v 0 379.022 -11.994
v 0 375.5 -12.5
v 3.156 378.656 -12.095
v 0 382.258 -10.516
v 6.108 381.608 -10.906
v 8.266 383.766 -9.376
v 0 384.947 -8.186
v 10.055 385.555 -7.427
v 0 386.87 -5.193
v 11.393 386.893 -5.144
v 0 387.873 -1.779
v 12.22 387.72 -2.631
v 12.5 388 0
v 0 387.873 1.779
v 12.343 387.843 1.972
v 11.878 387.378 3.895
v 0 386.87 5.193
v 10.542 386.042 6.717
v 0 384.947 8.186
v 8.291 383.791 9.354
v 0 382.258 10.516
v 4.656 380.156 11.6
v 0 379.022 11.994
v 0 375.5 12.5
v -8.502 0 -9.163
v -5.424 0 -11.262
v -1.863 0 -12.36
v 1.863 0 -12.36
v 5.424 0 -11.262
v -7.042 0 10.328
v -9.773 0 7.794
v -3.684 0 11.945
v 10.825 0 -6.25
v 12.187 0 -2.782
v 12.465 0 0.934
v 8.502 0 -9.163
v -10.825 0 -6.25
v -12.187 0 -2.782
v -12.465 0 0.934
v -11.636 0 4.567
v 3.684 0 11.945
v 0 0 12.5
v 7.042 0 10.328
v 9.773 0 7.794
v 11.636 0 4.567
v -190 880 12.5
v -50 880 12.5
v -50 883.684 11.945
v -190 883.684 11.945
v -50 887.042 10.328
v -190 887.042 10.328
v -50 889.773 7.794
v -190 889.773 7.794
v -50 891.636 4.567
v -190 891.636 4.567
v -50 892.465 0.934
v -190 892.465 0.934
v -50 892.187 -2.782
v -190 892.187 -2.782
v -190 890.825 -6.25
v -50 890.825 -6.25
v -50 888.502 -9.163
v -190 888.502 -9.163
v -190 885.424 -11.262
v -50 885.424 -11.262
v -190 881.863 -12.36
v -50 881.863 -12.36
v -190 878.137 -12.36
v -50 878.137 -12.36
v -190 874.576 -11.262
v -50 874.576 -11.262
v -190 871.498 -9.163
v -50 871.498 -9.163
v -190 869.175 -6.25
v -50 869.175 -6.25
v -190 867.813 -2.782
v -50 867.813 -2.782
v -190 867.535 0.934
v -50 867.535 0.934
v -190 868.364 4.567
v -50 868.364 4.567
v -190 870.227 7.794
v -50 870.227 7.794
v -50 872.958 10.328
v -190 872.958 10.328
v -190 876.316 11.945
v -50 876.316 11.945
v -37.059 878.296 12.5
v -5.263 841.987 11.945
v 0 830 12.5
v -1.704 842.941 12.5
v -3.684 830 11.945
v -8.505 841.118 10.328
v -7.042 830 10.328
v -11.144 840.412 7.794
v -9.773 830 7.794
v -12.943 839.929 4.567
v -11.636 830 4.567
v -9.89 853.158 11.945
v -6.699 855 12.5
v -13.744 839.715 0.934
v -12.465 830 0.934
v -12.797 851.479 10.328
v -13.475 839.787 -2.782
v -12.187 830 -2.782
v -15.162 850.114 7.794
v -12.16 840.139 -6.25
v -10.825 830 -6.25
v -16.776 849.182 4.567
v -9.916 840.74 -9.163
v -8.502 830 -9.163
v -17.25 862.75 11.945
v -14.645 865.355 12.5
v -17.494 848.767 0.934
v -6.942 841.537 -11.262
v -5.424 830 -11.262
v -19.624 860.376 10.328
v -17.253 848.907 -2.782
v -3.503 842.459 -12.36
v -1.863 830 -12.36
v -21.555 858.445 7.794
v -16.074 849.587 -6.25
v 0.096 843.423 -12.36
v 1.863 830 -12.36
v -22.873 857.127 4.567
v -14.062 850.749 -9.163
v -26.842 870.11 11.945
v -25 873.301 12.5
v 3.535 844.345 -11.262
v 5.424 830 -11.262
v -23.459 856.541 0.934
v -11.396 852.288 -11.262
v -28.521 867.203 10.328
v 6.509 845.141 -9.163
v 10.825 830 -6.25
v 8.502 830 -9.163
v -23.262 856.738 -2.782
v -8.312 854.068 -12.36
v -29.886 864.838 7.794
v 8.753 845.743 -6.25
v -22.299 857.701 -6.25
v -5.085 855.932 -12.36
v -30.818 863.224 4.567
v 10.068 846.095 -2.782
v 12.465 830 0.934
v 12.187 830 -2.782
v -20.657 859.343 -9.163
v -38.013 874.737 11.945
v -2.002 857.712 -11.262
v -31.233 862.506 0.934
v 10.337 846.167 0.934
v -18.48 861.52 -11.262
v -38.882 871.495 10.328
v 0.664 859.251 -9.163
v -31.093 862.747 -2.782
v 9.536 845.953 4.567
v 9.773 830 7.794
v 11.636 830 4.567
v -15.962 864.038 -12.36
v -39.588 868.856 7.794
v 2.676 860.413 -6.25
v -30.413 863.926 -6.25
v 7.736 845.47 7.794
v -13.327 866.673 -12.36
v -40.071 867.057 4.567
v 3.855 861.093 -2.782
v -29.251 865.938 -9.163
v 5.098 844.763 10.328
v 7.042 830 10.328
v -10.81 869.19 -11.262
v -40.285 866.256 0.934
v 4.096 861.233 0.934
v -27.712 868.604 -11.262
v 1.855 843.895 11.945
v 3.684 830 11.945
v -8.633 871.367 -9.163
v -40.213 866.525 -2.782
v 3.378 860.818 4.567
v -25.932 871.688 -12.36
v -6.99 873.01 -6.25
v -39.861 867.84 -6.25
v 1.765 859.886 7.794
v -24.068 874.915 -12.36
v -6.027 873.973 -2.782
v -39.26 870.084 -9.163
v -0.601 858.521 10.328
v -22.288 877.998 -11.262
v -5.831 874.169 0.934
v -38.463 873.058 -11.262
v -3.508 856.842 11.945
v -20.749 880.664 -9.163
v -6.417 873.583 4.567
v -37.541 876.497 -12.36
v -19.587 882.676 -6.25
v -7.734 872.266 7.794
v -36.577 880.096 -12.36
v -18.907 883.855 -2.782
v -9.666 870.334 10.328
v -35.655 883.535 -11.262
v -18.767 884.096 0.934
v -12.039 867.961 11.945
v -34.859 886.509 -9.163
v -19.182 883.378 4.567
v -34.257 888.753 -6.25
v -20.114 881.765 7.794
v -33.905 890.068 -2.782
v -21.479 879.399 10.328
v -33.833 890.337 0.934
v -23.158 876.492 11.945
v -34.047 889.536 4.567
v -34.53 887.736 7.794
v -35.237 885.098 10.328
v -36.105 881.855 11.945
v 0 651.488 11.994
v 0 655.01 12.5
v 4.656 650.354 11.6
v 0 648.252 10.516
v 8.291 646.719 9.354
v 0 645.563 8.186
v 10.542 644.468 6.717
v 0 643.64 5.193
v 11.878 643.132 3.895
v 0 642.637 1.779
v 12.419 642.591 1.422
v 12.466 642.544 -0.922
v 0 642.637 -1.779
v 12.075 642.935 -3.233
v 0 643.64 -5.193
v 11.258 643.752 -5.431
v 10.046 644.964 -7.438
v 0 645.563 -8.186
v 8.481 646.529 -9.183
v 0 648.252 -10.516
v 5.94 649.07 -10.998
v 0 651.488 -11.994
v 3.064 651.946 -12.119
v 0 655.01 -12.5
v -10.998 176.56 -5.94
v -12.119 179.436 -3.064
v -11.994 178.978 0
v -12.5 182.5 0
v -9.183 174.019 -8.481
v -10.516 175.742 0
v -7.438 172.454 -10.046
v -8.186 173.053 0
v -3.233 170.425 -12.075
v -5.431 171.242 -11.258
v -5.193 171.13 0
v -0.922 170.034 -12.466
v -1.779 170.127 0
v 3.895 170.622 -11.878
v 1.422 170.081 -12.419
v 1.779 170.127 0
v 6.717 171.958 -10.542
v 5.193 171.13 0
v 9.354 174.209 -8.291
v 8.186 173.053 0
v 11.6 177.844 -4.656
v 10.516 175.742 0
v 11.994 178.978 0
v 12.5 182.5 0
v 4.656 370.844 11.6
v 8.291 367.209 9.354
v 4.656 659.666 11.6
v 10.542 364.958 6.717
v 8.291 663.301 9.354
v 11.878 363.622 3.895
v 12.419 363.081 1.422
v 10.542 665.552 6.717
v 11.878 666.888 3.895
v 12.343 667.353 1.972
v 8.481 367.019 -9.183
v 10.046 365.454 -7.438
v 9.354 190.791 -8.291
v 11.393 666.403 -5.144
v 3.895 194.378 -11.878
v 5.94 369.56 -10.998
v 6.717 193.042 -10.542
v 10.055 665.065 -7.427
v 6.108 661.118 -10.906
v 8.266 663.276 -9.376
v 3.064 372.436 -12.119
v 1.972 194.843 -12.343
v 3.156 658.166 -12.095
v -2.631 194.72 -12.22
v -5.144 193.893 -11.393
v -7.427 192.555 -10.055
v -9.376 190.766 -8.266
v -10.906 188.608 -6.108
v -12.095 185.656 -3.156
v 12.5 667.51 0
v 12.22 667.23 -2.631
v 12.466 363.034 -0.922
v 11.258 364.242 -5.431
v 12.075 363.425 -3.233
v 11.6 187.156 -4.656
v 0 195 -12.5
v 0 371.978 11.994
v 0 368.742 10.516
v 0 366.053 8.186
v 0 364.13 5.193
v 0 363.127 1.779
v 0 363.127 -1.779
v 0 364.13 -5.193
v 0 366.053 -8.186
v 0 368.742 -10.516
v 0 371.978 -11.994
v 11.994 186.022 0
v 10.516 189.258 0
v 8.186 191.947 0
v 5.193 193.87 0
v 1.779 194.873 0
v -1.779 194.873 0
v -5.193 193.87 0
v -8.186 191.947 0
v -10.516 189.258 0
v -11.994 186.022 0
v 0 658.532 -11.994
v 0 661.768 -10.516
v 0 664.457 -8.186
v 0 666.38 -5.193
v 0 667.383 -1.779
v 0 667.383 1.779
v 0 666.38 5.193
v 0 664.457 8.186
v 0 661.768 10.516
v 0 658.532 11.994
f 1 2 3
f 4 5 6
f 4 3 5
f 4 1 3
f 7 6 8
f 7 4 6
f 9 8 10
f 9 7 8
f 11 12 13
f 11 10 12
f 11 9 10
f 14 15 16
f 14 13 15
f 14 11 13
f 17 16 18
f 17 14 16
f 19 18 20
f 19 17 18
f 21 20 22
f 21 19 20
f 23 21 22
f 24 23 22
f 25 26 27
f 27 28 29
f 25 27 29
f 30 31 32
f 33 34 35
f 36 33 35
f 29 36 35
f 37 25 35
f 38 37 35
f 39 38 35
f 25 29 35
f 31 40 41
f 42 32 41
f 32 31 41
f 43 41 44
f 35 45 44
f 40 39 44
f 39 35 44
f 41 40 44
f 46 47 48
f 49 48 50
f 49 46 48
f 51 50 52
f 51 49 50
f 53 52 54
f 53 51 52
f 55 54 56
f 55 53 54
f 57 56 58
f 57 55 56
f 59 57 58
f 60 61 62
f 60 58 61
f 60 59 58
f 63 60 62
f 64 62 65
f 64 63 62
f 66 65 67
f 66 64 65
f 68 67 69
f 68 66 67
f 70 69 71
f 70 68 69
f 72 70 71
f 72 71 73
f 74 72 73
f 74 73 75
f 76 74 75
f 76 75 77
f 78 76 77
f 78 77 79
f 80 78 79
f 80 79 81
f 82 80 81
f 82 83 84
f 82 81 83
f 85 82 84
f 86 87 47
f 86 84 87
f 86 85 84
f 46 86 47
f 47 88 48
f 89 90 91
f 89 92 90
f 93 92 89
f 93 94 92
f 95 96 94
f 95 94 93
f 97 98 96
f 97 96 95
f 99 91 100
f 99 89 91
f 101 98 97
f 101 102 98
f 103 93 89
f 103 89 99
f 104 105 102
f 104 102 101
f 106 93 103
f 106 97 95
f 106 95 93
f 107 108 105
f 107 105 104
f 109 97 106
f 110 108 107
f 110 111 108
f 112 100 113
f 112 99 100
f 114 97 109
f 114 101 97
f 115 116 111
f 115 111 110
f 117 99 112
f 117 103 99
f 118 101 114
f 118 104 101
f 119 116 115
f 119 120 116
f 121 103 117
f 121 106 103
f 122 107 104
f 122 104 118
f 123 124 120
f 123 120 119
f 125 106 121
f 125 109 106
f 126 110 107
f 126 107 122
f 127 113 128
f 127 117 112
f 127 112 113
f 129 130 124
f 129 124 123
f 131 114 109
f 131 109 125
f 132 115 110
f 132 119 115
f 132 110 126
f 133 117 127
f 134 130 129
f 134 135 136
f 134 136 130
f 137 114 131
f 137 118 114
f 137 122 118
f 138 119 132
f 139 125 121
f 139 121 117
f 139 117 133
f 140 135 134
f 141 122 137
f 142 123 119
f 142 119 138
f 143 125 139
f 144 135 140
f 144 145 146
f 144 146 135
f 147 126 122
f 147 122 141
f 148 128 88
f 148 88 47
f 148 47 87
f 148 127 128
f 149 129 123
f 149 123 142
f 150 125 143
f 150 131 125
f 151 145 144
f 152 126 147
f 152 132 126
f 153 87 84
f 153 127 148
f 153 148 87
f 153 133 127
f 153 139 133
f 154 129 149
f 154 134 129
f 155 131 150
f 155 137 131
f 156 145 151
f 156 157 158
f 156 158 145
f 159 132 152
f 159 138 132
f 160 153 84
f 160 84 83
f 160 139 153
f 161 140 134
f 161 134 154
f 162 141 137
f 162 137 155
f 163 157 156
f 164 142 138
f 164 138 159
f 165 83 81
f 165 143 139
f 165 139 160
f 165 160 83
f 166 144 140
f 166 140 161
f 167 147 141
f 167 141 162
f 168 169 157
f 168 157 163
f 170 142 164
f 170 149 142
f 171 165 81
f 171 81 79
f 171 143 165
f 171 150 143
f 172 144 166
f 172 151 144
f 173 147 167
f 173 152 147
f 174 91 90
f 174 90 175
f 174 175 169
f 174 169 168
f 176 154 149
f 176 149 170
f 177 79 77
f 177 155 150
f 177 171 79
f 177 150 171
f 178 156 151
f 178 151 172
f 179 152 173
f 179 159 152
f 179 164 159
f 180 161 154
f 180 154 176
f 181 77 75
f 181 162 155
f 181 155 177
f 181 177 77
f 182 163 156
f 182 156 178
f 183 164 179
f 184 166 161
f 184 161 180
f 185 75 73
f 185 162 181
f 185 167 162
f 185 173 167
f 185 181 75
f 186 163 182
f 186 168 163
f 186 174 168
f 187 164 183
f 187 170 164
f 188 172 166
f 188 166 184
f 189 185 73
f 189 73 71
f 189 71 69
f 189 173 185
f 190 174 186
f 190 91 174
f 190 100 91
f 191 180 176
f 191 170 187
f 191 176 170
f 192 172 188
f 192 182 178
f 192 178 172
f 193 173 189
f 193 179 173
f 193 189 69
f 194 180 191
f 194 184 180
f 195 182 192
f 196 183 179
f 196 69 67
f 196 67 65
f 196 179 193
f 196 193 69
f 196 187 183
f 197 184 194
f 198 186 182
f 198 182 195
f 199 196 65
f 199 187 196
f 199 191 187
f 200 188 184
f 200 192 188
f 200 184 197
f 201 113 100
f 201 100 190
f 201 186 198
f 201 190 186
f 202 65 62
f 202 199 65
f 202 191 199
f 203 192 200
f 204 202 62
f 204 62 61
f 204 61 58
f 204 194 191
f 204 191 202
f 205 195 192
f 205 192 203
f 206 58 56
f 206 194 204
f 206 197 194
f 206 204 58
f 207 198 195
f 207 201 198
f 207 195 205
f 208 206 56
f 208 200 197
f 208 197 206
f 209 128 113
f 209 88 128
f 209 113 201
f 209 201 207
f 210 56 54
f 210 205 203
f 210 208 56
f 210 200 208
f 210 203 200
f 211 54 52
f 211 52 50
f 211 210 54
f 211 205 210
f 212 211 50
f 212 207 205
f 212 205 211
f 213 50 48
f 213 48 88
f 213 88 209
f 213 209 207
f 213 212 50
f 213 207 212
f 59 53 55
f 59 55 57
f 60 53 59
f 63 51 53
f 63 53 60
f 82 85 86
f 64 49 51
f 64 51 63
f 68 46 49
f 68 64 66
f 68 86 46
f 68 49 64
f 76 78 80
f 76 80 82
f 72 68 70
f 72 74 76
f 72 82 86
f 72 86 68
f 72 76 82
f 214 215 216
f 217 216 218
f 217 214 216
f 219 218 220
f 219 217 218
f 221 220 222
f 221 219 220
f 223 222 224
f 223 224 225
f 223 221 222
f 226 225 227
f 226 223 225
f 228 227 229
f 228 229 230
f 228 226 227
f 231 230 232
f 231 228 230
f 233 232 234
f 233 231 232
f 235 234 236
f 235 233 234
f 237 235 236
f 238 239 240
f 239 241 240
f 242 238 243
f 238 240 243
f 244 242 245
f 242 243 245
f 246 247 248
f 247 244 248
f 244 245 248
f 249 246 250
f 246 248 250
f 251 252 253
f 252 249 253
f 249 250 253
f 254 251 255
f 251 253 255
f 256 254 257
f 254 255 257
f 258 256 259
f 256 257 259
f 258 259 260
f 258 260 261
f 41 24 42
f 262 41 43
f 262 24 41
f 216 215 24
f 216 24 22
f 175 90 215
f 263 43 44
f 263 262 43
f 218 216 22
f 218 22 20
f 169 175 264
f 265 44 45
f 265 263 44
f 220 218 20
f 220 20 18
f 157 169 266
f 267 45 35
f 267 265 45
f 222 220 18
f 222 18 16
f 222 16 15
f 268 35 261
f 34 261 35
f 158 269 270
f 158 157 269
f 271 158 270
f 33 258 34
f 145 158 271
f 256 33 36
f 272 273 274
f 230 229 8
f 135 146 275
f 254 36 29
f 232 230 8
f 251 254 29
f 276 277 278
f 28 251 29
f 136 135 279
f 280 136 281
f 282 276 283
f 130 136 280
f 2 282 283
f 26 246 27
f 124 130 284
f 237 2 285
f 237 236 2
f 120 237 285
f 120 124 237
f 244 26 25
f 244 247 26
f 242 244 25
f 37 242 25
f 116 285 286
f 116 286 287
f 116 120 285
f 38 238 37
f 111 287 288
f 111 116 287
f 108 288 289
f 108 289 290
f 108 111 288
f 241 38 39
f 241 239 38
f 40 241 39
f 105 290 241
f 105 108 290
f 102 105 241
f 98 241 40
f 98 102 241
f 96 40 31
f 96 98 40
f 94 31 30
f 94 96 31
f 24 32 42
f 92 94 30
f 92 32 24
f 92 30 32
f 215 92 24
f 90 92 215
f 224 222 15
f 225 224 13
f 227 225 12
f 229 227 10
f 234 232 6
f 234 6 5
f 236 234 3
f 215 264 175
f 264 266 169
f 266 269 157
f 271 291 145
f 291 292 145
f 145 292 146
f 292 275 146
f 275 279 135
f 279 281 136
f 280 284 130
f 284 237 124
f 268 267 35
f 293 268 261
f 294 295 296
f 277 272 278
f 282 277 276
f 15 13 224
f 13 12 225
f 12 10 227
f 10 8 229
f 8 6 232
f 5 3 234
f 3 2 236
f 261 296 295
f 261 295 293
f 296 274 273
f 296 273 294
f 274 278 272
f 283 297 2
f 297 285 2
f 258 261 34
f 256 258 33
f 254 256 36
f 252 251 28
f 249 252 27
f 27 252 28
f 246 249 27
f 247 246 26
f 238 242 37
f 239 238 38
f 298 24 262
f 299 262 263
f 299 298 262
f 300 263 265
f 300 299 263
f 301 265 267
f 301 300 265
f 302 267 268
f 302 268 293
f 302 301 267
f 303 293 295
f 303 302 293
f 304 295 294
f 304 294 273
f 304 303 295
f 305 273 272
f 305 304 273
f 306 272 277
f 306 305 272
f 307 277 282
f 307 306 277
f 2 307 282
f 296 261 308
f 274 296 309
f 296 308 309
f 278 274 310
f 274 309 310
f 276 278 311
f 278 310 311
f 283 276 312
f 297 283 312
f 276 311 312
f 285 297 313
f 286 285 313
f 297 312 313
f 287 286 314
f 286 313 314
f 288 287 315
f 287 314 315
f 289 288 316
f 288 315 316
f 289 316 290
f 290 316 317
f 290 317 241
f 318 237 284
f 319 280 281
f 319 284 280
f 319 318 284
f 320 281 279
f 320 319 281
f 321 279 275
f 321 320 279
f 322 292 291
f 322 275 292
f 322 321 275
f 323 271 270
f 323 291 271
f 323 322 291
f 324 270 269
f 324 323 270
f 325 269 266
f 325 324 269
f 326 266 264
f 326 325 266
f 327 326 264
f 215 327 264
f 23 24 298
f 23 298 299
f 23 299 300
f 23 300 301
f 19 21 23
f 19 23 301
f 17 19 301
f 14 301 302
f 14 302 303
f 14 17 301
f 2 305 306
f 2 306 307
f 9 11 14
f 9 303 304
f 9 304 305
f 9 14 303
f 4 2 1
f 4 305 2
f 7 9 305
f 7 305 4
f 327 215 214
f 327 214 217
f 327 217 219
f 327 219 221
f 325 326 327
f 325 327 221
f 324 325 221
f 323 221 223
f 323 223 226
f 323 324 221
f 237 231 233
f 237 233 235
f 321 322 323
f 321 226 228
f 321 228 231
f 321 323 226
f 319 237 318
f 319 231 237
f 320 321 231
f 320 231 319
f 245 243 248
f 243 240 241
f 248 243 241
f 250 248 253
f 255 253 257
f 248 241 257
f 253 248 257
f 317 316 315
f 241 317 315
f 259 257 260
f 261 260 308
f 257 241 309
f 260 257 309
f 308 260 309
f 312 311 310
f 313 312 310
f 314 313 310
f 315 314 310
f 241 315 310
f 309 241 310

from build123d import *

# Parameters (mm, degrees)
SWEEP1_PROFILE_R   = 12.5
SKETCH8_R          = 12.5
CUT_EXTRUDE3_DEPTH = 21
SKETCH2_R          = 12.5
CUT_EXTRUDE5_DEPTH = 13


with BuildPart() as part:
    # Sweep1: sweep along a path in Sketch1
    with BuildLine(Plane.XY) as sweep1_path:
        Line((0, 0), (0, 830))
        ThreePointArc((0, 830), (-14.644660941, 865.355339059), (-50, 880))
        Line((-50, 880), (-190, 880))
    # Sweep1 profile (on start of the path) → Sweep1 (sweep)
    with BuildSketch(Plane.ZX):
        Circle(SWEEP1_PROFILE_R)
    sweep(path=sweep1_path.line)

    # Sketch8 → Cut-Extrude3 (cut)
    with BuildSketch(Plane(origin=(0, 0, 0), x_dir=(0, 0, -1), z_dir=(1, 0, 0))):
        with Locations((0, 655.01)):
            Circle(SKETCH8_R)
        with Locations((0, 375.5)):
            Circle(SKETCH8_R)
    extrude(amount=CUT_EXTRUDE3_DEPTH, mode=Mode.SUBTRACT)

    # Sketch2 → Cut-Extrude5 (cut)
    with BuildSketch(Plane.XY):
        with Locations((0, 182.5)):
            Circle(SKETCH2_R)
    extrude(amount=-CUT_EXTRUDE5_DEPTH, mode=Mode.SUBTRACT)


solid = part.part
